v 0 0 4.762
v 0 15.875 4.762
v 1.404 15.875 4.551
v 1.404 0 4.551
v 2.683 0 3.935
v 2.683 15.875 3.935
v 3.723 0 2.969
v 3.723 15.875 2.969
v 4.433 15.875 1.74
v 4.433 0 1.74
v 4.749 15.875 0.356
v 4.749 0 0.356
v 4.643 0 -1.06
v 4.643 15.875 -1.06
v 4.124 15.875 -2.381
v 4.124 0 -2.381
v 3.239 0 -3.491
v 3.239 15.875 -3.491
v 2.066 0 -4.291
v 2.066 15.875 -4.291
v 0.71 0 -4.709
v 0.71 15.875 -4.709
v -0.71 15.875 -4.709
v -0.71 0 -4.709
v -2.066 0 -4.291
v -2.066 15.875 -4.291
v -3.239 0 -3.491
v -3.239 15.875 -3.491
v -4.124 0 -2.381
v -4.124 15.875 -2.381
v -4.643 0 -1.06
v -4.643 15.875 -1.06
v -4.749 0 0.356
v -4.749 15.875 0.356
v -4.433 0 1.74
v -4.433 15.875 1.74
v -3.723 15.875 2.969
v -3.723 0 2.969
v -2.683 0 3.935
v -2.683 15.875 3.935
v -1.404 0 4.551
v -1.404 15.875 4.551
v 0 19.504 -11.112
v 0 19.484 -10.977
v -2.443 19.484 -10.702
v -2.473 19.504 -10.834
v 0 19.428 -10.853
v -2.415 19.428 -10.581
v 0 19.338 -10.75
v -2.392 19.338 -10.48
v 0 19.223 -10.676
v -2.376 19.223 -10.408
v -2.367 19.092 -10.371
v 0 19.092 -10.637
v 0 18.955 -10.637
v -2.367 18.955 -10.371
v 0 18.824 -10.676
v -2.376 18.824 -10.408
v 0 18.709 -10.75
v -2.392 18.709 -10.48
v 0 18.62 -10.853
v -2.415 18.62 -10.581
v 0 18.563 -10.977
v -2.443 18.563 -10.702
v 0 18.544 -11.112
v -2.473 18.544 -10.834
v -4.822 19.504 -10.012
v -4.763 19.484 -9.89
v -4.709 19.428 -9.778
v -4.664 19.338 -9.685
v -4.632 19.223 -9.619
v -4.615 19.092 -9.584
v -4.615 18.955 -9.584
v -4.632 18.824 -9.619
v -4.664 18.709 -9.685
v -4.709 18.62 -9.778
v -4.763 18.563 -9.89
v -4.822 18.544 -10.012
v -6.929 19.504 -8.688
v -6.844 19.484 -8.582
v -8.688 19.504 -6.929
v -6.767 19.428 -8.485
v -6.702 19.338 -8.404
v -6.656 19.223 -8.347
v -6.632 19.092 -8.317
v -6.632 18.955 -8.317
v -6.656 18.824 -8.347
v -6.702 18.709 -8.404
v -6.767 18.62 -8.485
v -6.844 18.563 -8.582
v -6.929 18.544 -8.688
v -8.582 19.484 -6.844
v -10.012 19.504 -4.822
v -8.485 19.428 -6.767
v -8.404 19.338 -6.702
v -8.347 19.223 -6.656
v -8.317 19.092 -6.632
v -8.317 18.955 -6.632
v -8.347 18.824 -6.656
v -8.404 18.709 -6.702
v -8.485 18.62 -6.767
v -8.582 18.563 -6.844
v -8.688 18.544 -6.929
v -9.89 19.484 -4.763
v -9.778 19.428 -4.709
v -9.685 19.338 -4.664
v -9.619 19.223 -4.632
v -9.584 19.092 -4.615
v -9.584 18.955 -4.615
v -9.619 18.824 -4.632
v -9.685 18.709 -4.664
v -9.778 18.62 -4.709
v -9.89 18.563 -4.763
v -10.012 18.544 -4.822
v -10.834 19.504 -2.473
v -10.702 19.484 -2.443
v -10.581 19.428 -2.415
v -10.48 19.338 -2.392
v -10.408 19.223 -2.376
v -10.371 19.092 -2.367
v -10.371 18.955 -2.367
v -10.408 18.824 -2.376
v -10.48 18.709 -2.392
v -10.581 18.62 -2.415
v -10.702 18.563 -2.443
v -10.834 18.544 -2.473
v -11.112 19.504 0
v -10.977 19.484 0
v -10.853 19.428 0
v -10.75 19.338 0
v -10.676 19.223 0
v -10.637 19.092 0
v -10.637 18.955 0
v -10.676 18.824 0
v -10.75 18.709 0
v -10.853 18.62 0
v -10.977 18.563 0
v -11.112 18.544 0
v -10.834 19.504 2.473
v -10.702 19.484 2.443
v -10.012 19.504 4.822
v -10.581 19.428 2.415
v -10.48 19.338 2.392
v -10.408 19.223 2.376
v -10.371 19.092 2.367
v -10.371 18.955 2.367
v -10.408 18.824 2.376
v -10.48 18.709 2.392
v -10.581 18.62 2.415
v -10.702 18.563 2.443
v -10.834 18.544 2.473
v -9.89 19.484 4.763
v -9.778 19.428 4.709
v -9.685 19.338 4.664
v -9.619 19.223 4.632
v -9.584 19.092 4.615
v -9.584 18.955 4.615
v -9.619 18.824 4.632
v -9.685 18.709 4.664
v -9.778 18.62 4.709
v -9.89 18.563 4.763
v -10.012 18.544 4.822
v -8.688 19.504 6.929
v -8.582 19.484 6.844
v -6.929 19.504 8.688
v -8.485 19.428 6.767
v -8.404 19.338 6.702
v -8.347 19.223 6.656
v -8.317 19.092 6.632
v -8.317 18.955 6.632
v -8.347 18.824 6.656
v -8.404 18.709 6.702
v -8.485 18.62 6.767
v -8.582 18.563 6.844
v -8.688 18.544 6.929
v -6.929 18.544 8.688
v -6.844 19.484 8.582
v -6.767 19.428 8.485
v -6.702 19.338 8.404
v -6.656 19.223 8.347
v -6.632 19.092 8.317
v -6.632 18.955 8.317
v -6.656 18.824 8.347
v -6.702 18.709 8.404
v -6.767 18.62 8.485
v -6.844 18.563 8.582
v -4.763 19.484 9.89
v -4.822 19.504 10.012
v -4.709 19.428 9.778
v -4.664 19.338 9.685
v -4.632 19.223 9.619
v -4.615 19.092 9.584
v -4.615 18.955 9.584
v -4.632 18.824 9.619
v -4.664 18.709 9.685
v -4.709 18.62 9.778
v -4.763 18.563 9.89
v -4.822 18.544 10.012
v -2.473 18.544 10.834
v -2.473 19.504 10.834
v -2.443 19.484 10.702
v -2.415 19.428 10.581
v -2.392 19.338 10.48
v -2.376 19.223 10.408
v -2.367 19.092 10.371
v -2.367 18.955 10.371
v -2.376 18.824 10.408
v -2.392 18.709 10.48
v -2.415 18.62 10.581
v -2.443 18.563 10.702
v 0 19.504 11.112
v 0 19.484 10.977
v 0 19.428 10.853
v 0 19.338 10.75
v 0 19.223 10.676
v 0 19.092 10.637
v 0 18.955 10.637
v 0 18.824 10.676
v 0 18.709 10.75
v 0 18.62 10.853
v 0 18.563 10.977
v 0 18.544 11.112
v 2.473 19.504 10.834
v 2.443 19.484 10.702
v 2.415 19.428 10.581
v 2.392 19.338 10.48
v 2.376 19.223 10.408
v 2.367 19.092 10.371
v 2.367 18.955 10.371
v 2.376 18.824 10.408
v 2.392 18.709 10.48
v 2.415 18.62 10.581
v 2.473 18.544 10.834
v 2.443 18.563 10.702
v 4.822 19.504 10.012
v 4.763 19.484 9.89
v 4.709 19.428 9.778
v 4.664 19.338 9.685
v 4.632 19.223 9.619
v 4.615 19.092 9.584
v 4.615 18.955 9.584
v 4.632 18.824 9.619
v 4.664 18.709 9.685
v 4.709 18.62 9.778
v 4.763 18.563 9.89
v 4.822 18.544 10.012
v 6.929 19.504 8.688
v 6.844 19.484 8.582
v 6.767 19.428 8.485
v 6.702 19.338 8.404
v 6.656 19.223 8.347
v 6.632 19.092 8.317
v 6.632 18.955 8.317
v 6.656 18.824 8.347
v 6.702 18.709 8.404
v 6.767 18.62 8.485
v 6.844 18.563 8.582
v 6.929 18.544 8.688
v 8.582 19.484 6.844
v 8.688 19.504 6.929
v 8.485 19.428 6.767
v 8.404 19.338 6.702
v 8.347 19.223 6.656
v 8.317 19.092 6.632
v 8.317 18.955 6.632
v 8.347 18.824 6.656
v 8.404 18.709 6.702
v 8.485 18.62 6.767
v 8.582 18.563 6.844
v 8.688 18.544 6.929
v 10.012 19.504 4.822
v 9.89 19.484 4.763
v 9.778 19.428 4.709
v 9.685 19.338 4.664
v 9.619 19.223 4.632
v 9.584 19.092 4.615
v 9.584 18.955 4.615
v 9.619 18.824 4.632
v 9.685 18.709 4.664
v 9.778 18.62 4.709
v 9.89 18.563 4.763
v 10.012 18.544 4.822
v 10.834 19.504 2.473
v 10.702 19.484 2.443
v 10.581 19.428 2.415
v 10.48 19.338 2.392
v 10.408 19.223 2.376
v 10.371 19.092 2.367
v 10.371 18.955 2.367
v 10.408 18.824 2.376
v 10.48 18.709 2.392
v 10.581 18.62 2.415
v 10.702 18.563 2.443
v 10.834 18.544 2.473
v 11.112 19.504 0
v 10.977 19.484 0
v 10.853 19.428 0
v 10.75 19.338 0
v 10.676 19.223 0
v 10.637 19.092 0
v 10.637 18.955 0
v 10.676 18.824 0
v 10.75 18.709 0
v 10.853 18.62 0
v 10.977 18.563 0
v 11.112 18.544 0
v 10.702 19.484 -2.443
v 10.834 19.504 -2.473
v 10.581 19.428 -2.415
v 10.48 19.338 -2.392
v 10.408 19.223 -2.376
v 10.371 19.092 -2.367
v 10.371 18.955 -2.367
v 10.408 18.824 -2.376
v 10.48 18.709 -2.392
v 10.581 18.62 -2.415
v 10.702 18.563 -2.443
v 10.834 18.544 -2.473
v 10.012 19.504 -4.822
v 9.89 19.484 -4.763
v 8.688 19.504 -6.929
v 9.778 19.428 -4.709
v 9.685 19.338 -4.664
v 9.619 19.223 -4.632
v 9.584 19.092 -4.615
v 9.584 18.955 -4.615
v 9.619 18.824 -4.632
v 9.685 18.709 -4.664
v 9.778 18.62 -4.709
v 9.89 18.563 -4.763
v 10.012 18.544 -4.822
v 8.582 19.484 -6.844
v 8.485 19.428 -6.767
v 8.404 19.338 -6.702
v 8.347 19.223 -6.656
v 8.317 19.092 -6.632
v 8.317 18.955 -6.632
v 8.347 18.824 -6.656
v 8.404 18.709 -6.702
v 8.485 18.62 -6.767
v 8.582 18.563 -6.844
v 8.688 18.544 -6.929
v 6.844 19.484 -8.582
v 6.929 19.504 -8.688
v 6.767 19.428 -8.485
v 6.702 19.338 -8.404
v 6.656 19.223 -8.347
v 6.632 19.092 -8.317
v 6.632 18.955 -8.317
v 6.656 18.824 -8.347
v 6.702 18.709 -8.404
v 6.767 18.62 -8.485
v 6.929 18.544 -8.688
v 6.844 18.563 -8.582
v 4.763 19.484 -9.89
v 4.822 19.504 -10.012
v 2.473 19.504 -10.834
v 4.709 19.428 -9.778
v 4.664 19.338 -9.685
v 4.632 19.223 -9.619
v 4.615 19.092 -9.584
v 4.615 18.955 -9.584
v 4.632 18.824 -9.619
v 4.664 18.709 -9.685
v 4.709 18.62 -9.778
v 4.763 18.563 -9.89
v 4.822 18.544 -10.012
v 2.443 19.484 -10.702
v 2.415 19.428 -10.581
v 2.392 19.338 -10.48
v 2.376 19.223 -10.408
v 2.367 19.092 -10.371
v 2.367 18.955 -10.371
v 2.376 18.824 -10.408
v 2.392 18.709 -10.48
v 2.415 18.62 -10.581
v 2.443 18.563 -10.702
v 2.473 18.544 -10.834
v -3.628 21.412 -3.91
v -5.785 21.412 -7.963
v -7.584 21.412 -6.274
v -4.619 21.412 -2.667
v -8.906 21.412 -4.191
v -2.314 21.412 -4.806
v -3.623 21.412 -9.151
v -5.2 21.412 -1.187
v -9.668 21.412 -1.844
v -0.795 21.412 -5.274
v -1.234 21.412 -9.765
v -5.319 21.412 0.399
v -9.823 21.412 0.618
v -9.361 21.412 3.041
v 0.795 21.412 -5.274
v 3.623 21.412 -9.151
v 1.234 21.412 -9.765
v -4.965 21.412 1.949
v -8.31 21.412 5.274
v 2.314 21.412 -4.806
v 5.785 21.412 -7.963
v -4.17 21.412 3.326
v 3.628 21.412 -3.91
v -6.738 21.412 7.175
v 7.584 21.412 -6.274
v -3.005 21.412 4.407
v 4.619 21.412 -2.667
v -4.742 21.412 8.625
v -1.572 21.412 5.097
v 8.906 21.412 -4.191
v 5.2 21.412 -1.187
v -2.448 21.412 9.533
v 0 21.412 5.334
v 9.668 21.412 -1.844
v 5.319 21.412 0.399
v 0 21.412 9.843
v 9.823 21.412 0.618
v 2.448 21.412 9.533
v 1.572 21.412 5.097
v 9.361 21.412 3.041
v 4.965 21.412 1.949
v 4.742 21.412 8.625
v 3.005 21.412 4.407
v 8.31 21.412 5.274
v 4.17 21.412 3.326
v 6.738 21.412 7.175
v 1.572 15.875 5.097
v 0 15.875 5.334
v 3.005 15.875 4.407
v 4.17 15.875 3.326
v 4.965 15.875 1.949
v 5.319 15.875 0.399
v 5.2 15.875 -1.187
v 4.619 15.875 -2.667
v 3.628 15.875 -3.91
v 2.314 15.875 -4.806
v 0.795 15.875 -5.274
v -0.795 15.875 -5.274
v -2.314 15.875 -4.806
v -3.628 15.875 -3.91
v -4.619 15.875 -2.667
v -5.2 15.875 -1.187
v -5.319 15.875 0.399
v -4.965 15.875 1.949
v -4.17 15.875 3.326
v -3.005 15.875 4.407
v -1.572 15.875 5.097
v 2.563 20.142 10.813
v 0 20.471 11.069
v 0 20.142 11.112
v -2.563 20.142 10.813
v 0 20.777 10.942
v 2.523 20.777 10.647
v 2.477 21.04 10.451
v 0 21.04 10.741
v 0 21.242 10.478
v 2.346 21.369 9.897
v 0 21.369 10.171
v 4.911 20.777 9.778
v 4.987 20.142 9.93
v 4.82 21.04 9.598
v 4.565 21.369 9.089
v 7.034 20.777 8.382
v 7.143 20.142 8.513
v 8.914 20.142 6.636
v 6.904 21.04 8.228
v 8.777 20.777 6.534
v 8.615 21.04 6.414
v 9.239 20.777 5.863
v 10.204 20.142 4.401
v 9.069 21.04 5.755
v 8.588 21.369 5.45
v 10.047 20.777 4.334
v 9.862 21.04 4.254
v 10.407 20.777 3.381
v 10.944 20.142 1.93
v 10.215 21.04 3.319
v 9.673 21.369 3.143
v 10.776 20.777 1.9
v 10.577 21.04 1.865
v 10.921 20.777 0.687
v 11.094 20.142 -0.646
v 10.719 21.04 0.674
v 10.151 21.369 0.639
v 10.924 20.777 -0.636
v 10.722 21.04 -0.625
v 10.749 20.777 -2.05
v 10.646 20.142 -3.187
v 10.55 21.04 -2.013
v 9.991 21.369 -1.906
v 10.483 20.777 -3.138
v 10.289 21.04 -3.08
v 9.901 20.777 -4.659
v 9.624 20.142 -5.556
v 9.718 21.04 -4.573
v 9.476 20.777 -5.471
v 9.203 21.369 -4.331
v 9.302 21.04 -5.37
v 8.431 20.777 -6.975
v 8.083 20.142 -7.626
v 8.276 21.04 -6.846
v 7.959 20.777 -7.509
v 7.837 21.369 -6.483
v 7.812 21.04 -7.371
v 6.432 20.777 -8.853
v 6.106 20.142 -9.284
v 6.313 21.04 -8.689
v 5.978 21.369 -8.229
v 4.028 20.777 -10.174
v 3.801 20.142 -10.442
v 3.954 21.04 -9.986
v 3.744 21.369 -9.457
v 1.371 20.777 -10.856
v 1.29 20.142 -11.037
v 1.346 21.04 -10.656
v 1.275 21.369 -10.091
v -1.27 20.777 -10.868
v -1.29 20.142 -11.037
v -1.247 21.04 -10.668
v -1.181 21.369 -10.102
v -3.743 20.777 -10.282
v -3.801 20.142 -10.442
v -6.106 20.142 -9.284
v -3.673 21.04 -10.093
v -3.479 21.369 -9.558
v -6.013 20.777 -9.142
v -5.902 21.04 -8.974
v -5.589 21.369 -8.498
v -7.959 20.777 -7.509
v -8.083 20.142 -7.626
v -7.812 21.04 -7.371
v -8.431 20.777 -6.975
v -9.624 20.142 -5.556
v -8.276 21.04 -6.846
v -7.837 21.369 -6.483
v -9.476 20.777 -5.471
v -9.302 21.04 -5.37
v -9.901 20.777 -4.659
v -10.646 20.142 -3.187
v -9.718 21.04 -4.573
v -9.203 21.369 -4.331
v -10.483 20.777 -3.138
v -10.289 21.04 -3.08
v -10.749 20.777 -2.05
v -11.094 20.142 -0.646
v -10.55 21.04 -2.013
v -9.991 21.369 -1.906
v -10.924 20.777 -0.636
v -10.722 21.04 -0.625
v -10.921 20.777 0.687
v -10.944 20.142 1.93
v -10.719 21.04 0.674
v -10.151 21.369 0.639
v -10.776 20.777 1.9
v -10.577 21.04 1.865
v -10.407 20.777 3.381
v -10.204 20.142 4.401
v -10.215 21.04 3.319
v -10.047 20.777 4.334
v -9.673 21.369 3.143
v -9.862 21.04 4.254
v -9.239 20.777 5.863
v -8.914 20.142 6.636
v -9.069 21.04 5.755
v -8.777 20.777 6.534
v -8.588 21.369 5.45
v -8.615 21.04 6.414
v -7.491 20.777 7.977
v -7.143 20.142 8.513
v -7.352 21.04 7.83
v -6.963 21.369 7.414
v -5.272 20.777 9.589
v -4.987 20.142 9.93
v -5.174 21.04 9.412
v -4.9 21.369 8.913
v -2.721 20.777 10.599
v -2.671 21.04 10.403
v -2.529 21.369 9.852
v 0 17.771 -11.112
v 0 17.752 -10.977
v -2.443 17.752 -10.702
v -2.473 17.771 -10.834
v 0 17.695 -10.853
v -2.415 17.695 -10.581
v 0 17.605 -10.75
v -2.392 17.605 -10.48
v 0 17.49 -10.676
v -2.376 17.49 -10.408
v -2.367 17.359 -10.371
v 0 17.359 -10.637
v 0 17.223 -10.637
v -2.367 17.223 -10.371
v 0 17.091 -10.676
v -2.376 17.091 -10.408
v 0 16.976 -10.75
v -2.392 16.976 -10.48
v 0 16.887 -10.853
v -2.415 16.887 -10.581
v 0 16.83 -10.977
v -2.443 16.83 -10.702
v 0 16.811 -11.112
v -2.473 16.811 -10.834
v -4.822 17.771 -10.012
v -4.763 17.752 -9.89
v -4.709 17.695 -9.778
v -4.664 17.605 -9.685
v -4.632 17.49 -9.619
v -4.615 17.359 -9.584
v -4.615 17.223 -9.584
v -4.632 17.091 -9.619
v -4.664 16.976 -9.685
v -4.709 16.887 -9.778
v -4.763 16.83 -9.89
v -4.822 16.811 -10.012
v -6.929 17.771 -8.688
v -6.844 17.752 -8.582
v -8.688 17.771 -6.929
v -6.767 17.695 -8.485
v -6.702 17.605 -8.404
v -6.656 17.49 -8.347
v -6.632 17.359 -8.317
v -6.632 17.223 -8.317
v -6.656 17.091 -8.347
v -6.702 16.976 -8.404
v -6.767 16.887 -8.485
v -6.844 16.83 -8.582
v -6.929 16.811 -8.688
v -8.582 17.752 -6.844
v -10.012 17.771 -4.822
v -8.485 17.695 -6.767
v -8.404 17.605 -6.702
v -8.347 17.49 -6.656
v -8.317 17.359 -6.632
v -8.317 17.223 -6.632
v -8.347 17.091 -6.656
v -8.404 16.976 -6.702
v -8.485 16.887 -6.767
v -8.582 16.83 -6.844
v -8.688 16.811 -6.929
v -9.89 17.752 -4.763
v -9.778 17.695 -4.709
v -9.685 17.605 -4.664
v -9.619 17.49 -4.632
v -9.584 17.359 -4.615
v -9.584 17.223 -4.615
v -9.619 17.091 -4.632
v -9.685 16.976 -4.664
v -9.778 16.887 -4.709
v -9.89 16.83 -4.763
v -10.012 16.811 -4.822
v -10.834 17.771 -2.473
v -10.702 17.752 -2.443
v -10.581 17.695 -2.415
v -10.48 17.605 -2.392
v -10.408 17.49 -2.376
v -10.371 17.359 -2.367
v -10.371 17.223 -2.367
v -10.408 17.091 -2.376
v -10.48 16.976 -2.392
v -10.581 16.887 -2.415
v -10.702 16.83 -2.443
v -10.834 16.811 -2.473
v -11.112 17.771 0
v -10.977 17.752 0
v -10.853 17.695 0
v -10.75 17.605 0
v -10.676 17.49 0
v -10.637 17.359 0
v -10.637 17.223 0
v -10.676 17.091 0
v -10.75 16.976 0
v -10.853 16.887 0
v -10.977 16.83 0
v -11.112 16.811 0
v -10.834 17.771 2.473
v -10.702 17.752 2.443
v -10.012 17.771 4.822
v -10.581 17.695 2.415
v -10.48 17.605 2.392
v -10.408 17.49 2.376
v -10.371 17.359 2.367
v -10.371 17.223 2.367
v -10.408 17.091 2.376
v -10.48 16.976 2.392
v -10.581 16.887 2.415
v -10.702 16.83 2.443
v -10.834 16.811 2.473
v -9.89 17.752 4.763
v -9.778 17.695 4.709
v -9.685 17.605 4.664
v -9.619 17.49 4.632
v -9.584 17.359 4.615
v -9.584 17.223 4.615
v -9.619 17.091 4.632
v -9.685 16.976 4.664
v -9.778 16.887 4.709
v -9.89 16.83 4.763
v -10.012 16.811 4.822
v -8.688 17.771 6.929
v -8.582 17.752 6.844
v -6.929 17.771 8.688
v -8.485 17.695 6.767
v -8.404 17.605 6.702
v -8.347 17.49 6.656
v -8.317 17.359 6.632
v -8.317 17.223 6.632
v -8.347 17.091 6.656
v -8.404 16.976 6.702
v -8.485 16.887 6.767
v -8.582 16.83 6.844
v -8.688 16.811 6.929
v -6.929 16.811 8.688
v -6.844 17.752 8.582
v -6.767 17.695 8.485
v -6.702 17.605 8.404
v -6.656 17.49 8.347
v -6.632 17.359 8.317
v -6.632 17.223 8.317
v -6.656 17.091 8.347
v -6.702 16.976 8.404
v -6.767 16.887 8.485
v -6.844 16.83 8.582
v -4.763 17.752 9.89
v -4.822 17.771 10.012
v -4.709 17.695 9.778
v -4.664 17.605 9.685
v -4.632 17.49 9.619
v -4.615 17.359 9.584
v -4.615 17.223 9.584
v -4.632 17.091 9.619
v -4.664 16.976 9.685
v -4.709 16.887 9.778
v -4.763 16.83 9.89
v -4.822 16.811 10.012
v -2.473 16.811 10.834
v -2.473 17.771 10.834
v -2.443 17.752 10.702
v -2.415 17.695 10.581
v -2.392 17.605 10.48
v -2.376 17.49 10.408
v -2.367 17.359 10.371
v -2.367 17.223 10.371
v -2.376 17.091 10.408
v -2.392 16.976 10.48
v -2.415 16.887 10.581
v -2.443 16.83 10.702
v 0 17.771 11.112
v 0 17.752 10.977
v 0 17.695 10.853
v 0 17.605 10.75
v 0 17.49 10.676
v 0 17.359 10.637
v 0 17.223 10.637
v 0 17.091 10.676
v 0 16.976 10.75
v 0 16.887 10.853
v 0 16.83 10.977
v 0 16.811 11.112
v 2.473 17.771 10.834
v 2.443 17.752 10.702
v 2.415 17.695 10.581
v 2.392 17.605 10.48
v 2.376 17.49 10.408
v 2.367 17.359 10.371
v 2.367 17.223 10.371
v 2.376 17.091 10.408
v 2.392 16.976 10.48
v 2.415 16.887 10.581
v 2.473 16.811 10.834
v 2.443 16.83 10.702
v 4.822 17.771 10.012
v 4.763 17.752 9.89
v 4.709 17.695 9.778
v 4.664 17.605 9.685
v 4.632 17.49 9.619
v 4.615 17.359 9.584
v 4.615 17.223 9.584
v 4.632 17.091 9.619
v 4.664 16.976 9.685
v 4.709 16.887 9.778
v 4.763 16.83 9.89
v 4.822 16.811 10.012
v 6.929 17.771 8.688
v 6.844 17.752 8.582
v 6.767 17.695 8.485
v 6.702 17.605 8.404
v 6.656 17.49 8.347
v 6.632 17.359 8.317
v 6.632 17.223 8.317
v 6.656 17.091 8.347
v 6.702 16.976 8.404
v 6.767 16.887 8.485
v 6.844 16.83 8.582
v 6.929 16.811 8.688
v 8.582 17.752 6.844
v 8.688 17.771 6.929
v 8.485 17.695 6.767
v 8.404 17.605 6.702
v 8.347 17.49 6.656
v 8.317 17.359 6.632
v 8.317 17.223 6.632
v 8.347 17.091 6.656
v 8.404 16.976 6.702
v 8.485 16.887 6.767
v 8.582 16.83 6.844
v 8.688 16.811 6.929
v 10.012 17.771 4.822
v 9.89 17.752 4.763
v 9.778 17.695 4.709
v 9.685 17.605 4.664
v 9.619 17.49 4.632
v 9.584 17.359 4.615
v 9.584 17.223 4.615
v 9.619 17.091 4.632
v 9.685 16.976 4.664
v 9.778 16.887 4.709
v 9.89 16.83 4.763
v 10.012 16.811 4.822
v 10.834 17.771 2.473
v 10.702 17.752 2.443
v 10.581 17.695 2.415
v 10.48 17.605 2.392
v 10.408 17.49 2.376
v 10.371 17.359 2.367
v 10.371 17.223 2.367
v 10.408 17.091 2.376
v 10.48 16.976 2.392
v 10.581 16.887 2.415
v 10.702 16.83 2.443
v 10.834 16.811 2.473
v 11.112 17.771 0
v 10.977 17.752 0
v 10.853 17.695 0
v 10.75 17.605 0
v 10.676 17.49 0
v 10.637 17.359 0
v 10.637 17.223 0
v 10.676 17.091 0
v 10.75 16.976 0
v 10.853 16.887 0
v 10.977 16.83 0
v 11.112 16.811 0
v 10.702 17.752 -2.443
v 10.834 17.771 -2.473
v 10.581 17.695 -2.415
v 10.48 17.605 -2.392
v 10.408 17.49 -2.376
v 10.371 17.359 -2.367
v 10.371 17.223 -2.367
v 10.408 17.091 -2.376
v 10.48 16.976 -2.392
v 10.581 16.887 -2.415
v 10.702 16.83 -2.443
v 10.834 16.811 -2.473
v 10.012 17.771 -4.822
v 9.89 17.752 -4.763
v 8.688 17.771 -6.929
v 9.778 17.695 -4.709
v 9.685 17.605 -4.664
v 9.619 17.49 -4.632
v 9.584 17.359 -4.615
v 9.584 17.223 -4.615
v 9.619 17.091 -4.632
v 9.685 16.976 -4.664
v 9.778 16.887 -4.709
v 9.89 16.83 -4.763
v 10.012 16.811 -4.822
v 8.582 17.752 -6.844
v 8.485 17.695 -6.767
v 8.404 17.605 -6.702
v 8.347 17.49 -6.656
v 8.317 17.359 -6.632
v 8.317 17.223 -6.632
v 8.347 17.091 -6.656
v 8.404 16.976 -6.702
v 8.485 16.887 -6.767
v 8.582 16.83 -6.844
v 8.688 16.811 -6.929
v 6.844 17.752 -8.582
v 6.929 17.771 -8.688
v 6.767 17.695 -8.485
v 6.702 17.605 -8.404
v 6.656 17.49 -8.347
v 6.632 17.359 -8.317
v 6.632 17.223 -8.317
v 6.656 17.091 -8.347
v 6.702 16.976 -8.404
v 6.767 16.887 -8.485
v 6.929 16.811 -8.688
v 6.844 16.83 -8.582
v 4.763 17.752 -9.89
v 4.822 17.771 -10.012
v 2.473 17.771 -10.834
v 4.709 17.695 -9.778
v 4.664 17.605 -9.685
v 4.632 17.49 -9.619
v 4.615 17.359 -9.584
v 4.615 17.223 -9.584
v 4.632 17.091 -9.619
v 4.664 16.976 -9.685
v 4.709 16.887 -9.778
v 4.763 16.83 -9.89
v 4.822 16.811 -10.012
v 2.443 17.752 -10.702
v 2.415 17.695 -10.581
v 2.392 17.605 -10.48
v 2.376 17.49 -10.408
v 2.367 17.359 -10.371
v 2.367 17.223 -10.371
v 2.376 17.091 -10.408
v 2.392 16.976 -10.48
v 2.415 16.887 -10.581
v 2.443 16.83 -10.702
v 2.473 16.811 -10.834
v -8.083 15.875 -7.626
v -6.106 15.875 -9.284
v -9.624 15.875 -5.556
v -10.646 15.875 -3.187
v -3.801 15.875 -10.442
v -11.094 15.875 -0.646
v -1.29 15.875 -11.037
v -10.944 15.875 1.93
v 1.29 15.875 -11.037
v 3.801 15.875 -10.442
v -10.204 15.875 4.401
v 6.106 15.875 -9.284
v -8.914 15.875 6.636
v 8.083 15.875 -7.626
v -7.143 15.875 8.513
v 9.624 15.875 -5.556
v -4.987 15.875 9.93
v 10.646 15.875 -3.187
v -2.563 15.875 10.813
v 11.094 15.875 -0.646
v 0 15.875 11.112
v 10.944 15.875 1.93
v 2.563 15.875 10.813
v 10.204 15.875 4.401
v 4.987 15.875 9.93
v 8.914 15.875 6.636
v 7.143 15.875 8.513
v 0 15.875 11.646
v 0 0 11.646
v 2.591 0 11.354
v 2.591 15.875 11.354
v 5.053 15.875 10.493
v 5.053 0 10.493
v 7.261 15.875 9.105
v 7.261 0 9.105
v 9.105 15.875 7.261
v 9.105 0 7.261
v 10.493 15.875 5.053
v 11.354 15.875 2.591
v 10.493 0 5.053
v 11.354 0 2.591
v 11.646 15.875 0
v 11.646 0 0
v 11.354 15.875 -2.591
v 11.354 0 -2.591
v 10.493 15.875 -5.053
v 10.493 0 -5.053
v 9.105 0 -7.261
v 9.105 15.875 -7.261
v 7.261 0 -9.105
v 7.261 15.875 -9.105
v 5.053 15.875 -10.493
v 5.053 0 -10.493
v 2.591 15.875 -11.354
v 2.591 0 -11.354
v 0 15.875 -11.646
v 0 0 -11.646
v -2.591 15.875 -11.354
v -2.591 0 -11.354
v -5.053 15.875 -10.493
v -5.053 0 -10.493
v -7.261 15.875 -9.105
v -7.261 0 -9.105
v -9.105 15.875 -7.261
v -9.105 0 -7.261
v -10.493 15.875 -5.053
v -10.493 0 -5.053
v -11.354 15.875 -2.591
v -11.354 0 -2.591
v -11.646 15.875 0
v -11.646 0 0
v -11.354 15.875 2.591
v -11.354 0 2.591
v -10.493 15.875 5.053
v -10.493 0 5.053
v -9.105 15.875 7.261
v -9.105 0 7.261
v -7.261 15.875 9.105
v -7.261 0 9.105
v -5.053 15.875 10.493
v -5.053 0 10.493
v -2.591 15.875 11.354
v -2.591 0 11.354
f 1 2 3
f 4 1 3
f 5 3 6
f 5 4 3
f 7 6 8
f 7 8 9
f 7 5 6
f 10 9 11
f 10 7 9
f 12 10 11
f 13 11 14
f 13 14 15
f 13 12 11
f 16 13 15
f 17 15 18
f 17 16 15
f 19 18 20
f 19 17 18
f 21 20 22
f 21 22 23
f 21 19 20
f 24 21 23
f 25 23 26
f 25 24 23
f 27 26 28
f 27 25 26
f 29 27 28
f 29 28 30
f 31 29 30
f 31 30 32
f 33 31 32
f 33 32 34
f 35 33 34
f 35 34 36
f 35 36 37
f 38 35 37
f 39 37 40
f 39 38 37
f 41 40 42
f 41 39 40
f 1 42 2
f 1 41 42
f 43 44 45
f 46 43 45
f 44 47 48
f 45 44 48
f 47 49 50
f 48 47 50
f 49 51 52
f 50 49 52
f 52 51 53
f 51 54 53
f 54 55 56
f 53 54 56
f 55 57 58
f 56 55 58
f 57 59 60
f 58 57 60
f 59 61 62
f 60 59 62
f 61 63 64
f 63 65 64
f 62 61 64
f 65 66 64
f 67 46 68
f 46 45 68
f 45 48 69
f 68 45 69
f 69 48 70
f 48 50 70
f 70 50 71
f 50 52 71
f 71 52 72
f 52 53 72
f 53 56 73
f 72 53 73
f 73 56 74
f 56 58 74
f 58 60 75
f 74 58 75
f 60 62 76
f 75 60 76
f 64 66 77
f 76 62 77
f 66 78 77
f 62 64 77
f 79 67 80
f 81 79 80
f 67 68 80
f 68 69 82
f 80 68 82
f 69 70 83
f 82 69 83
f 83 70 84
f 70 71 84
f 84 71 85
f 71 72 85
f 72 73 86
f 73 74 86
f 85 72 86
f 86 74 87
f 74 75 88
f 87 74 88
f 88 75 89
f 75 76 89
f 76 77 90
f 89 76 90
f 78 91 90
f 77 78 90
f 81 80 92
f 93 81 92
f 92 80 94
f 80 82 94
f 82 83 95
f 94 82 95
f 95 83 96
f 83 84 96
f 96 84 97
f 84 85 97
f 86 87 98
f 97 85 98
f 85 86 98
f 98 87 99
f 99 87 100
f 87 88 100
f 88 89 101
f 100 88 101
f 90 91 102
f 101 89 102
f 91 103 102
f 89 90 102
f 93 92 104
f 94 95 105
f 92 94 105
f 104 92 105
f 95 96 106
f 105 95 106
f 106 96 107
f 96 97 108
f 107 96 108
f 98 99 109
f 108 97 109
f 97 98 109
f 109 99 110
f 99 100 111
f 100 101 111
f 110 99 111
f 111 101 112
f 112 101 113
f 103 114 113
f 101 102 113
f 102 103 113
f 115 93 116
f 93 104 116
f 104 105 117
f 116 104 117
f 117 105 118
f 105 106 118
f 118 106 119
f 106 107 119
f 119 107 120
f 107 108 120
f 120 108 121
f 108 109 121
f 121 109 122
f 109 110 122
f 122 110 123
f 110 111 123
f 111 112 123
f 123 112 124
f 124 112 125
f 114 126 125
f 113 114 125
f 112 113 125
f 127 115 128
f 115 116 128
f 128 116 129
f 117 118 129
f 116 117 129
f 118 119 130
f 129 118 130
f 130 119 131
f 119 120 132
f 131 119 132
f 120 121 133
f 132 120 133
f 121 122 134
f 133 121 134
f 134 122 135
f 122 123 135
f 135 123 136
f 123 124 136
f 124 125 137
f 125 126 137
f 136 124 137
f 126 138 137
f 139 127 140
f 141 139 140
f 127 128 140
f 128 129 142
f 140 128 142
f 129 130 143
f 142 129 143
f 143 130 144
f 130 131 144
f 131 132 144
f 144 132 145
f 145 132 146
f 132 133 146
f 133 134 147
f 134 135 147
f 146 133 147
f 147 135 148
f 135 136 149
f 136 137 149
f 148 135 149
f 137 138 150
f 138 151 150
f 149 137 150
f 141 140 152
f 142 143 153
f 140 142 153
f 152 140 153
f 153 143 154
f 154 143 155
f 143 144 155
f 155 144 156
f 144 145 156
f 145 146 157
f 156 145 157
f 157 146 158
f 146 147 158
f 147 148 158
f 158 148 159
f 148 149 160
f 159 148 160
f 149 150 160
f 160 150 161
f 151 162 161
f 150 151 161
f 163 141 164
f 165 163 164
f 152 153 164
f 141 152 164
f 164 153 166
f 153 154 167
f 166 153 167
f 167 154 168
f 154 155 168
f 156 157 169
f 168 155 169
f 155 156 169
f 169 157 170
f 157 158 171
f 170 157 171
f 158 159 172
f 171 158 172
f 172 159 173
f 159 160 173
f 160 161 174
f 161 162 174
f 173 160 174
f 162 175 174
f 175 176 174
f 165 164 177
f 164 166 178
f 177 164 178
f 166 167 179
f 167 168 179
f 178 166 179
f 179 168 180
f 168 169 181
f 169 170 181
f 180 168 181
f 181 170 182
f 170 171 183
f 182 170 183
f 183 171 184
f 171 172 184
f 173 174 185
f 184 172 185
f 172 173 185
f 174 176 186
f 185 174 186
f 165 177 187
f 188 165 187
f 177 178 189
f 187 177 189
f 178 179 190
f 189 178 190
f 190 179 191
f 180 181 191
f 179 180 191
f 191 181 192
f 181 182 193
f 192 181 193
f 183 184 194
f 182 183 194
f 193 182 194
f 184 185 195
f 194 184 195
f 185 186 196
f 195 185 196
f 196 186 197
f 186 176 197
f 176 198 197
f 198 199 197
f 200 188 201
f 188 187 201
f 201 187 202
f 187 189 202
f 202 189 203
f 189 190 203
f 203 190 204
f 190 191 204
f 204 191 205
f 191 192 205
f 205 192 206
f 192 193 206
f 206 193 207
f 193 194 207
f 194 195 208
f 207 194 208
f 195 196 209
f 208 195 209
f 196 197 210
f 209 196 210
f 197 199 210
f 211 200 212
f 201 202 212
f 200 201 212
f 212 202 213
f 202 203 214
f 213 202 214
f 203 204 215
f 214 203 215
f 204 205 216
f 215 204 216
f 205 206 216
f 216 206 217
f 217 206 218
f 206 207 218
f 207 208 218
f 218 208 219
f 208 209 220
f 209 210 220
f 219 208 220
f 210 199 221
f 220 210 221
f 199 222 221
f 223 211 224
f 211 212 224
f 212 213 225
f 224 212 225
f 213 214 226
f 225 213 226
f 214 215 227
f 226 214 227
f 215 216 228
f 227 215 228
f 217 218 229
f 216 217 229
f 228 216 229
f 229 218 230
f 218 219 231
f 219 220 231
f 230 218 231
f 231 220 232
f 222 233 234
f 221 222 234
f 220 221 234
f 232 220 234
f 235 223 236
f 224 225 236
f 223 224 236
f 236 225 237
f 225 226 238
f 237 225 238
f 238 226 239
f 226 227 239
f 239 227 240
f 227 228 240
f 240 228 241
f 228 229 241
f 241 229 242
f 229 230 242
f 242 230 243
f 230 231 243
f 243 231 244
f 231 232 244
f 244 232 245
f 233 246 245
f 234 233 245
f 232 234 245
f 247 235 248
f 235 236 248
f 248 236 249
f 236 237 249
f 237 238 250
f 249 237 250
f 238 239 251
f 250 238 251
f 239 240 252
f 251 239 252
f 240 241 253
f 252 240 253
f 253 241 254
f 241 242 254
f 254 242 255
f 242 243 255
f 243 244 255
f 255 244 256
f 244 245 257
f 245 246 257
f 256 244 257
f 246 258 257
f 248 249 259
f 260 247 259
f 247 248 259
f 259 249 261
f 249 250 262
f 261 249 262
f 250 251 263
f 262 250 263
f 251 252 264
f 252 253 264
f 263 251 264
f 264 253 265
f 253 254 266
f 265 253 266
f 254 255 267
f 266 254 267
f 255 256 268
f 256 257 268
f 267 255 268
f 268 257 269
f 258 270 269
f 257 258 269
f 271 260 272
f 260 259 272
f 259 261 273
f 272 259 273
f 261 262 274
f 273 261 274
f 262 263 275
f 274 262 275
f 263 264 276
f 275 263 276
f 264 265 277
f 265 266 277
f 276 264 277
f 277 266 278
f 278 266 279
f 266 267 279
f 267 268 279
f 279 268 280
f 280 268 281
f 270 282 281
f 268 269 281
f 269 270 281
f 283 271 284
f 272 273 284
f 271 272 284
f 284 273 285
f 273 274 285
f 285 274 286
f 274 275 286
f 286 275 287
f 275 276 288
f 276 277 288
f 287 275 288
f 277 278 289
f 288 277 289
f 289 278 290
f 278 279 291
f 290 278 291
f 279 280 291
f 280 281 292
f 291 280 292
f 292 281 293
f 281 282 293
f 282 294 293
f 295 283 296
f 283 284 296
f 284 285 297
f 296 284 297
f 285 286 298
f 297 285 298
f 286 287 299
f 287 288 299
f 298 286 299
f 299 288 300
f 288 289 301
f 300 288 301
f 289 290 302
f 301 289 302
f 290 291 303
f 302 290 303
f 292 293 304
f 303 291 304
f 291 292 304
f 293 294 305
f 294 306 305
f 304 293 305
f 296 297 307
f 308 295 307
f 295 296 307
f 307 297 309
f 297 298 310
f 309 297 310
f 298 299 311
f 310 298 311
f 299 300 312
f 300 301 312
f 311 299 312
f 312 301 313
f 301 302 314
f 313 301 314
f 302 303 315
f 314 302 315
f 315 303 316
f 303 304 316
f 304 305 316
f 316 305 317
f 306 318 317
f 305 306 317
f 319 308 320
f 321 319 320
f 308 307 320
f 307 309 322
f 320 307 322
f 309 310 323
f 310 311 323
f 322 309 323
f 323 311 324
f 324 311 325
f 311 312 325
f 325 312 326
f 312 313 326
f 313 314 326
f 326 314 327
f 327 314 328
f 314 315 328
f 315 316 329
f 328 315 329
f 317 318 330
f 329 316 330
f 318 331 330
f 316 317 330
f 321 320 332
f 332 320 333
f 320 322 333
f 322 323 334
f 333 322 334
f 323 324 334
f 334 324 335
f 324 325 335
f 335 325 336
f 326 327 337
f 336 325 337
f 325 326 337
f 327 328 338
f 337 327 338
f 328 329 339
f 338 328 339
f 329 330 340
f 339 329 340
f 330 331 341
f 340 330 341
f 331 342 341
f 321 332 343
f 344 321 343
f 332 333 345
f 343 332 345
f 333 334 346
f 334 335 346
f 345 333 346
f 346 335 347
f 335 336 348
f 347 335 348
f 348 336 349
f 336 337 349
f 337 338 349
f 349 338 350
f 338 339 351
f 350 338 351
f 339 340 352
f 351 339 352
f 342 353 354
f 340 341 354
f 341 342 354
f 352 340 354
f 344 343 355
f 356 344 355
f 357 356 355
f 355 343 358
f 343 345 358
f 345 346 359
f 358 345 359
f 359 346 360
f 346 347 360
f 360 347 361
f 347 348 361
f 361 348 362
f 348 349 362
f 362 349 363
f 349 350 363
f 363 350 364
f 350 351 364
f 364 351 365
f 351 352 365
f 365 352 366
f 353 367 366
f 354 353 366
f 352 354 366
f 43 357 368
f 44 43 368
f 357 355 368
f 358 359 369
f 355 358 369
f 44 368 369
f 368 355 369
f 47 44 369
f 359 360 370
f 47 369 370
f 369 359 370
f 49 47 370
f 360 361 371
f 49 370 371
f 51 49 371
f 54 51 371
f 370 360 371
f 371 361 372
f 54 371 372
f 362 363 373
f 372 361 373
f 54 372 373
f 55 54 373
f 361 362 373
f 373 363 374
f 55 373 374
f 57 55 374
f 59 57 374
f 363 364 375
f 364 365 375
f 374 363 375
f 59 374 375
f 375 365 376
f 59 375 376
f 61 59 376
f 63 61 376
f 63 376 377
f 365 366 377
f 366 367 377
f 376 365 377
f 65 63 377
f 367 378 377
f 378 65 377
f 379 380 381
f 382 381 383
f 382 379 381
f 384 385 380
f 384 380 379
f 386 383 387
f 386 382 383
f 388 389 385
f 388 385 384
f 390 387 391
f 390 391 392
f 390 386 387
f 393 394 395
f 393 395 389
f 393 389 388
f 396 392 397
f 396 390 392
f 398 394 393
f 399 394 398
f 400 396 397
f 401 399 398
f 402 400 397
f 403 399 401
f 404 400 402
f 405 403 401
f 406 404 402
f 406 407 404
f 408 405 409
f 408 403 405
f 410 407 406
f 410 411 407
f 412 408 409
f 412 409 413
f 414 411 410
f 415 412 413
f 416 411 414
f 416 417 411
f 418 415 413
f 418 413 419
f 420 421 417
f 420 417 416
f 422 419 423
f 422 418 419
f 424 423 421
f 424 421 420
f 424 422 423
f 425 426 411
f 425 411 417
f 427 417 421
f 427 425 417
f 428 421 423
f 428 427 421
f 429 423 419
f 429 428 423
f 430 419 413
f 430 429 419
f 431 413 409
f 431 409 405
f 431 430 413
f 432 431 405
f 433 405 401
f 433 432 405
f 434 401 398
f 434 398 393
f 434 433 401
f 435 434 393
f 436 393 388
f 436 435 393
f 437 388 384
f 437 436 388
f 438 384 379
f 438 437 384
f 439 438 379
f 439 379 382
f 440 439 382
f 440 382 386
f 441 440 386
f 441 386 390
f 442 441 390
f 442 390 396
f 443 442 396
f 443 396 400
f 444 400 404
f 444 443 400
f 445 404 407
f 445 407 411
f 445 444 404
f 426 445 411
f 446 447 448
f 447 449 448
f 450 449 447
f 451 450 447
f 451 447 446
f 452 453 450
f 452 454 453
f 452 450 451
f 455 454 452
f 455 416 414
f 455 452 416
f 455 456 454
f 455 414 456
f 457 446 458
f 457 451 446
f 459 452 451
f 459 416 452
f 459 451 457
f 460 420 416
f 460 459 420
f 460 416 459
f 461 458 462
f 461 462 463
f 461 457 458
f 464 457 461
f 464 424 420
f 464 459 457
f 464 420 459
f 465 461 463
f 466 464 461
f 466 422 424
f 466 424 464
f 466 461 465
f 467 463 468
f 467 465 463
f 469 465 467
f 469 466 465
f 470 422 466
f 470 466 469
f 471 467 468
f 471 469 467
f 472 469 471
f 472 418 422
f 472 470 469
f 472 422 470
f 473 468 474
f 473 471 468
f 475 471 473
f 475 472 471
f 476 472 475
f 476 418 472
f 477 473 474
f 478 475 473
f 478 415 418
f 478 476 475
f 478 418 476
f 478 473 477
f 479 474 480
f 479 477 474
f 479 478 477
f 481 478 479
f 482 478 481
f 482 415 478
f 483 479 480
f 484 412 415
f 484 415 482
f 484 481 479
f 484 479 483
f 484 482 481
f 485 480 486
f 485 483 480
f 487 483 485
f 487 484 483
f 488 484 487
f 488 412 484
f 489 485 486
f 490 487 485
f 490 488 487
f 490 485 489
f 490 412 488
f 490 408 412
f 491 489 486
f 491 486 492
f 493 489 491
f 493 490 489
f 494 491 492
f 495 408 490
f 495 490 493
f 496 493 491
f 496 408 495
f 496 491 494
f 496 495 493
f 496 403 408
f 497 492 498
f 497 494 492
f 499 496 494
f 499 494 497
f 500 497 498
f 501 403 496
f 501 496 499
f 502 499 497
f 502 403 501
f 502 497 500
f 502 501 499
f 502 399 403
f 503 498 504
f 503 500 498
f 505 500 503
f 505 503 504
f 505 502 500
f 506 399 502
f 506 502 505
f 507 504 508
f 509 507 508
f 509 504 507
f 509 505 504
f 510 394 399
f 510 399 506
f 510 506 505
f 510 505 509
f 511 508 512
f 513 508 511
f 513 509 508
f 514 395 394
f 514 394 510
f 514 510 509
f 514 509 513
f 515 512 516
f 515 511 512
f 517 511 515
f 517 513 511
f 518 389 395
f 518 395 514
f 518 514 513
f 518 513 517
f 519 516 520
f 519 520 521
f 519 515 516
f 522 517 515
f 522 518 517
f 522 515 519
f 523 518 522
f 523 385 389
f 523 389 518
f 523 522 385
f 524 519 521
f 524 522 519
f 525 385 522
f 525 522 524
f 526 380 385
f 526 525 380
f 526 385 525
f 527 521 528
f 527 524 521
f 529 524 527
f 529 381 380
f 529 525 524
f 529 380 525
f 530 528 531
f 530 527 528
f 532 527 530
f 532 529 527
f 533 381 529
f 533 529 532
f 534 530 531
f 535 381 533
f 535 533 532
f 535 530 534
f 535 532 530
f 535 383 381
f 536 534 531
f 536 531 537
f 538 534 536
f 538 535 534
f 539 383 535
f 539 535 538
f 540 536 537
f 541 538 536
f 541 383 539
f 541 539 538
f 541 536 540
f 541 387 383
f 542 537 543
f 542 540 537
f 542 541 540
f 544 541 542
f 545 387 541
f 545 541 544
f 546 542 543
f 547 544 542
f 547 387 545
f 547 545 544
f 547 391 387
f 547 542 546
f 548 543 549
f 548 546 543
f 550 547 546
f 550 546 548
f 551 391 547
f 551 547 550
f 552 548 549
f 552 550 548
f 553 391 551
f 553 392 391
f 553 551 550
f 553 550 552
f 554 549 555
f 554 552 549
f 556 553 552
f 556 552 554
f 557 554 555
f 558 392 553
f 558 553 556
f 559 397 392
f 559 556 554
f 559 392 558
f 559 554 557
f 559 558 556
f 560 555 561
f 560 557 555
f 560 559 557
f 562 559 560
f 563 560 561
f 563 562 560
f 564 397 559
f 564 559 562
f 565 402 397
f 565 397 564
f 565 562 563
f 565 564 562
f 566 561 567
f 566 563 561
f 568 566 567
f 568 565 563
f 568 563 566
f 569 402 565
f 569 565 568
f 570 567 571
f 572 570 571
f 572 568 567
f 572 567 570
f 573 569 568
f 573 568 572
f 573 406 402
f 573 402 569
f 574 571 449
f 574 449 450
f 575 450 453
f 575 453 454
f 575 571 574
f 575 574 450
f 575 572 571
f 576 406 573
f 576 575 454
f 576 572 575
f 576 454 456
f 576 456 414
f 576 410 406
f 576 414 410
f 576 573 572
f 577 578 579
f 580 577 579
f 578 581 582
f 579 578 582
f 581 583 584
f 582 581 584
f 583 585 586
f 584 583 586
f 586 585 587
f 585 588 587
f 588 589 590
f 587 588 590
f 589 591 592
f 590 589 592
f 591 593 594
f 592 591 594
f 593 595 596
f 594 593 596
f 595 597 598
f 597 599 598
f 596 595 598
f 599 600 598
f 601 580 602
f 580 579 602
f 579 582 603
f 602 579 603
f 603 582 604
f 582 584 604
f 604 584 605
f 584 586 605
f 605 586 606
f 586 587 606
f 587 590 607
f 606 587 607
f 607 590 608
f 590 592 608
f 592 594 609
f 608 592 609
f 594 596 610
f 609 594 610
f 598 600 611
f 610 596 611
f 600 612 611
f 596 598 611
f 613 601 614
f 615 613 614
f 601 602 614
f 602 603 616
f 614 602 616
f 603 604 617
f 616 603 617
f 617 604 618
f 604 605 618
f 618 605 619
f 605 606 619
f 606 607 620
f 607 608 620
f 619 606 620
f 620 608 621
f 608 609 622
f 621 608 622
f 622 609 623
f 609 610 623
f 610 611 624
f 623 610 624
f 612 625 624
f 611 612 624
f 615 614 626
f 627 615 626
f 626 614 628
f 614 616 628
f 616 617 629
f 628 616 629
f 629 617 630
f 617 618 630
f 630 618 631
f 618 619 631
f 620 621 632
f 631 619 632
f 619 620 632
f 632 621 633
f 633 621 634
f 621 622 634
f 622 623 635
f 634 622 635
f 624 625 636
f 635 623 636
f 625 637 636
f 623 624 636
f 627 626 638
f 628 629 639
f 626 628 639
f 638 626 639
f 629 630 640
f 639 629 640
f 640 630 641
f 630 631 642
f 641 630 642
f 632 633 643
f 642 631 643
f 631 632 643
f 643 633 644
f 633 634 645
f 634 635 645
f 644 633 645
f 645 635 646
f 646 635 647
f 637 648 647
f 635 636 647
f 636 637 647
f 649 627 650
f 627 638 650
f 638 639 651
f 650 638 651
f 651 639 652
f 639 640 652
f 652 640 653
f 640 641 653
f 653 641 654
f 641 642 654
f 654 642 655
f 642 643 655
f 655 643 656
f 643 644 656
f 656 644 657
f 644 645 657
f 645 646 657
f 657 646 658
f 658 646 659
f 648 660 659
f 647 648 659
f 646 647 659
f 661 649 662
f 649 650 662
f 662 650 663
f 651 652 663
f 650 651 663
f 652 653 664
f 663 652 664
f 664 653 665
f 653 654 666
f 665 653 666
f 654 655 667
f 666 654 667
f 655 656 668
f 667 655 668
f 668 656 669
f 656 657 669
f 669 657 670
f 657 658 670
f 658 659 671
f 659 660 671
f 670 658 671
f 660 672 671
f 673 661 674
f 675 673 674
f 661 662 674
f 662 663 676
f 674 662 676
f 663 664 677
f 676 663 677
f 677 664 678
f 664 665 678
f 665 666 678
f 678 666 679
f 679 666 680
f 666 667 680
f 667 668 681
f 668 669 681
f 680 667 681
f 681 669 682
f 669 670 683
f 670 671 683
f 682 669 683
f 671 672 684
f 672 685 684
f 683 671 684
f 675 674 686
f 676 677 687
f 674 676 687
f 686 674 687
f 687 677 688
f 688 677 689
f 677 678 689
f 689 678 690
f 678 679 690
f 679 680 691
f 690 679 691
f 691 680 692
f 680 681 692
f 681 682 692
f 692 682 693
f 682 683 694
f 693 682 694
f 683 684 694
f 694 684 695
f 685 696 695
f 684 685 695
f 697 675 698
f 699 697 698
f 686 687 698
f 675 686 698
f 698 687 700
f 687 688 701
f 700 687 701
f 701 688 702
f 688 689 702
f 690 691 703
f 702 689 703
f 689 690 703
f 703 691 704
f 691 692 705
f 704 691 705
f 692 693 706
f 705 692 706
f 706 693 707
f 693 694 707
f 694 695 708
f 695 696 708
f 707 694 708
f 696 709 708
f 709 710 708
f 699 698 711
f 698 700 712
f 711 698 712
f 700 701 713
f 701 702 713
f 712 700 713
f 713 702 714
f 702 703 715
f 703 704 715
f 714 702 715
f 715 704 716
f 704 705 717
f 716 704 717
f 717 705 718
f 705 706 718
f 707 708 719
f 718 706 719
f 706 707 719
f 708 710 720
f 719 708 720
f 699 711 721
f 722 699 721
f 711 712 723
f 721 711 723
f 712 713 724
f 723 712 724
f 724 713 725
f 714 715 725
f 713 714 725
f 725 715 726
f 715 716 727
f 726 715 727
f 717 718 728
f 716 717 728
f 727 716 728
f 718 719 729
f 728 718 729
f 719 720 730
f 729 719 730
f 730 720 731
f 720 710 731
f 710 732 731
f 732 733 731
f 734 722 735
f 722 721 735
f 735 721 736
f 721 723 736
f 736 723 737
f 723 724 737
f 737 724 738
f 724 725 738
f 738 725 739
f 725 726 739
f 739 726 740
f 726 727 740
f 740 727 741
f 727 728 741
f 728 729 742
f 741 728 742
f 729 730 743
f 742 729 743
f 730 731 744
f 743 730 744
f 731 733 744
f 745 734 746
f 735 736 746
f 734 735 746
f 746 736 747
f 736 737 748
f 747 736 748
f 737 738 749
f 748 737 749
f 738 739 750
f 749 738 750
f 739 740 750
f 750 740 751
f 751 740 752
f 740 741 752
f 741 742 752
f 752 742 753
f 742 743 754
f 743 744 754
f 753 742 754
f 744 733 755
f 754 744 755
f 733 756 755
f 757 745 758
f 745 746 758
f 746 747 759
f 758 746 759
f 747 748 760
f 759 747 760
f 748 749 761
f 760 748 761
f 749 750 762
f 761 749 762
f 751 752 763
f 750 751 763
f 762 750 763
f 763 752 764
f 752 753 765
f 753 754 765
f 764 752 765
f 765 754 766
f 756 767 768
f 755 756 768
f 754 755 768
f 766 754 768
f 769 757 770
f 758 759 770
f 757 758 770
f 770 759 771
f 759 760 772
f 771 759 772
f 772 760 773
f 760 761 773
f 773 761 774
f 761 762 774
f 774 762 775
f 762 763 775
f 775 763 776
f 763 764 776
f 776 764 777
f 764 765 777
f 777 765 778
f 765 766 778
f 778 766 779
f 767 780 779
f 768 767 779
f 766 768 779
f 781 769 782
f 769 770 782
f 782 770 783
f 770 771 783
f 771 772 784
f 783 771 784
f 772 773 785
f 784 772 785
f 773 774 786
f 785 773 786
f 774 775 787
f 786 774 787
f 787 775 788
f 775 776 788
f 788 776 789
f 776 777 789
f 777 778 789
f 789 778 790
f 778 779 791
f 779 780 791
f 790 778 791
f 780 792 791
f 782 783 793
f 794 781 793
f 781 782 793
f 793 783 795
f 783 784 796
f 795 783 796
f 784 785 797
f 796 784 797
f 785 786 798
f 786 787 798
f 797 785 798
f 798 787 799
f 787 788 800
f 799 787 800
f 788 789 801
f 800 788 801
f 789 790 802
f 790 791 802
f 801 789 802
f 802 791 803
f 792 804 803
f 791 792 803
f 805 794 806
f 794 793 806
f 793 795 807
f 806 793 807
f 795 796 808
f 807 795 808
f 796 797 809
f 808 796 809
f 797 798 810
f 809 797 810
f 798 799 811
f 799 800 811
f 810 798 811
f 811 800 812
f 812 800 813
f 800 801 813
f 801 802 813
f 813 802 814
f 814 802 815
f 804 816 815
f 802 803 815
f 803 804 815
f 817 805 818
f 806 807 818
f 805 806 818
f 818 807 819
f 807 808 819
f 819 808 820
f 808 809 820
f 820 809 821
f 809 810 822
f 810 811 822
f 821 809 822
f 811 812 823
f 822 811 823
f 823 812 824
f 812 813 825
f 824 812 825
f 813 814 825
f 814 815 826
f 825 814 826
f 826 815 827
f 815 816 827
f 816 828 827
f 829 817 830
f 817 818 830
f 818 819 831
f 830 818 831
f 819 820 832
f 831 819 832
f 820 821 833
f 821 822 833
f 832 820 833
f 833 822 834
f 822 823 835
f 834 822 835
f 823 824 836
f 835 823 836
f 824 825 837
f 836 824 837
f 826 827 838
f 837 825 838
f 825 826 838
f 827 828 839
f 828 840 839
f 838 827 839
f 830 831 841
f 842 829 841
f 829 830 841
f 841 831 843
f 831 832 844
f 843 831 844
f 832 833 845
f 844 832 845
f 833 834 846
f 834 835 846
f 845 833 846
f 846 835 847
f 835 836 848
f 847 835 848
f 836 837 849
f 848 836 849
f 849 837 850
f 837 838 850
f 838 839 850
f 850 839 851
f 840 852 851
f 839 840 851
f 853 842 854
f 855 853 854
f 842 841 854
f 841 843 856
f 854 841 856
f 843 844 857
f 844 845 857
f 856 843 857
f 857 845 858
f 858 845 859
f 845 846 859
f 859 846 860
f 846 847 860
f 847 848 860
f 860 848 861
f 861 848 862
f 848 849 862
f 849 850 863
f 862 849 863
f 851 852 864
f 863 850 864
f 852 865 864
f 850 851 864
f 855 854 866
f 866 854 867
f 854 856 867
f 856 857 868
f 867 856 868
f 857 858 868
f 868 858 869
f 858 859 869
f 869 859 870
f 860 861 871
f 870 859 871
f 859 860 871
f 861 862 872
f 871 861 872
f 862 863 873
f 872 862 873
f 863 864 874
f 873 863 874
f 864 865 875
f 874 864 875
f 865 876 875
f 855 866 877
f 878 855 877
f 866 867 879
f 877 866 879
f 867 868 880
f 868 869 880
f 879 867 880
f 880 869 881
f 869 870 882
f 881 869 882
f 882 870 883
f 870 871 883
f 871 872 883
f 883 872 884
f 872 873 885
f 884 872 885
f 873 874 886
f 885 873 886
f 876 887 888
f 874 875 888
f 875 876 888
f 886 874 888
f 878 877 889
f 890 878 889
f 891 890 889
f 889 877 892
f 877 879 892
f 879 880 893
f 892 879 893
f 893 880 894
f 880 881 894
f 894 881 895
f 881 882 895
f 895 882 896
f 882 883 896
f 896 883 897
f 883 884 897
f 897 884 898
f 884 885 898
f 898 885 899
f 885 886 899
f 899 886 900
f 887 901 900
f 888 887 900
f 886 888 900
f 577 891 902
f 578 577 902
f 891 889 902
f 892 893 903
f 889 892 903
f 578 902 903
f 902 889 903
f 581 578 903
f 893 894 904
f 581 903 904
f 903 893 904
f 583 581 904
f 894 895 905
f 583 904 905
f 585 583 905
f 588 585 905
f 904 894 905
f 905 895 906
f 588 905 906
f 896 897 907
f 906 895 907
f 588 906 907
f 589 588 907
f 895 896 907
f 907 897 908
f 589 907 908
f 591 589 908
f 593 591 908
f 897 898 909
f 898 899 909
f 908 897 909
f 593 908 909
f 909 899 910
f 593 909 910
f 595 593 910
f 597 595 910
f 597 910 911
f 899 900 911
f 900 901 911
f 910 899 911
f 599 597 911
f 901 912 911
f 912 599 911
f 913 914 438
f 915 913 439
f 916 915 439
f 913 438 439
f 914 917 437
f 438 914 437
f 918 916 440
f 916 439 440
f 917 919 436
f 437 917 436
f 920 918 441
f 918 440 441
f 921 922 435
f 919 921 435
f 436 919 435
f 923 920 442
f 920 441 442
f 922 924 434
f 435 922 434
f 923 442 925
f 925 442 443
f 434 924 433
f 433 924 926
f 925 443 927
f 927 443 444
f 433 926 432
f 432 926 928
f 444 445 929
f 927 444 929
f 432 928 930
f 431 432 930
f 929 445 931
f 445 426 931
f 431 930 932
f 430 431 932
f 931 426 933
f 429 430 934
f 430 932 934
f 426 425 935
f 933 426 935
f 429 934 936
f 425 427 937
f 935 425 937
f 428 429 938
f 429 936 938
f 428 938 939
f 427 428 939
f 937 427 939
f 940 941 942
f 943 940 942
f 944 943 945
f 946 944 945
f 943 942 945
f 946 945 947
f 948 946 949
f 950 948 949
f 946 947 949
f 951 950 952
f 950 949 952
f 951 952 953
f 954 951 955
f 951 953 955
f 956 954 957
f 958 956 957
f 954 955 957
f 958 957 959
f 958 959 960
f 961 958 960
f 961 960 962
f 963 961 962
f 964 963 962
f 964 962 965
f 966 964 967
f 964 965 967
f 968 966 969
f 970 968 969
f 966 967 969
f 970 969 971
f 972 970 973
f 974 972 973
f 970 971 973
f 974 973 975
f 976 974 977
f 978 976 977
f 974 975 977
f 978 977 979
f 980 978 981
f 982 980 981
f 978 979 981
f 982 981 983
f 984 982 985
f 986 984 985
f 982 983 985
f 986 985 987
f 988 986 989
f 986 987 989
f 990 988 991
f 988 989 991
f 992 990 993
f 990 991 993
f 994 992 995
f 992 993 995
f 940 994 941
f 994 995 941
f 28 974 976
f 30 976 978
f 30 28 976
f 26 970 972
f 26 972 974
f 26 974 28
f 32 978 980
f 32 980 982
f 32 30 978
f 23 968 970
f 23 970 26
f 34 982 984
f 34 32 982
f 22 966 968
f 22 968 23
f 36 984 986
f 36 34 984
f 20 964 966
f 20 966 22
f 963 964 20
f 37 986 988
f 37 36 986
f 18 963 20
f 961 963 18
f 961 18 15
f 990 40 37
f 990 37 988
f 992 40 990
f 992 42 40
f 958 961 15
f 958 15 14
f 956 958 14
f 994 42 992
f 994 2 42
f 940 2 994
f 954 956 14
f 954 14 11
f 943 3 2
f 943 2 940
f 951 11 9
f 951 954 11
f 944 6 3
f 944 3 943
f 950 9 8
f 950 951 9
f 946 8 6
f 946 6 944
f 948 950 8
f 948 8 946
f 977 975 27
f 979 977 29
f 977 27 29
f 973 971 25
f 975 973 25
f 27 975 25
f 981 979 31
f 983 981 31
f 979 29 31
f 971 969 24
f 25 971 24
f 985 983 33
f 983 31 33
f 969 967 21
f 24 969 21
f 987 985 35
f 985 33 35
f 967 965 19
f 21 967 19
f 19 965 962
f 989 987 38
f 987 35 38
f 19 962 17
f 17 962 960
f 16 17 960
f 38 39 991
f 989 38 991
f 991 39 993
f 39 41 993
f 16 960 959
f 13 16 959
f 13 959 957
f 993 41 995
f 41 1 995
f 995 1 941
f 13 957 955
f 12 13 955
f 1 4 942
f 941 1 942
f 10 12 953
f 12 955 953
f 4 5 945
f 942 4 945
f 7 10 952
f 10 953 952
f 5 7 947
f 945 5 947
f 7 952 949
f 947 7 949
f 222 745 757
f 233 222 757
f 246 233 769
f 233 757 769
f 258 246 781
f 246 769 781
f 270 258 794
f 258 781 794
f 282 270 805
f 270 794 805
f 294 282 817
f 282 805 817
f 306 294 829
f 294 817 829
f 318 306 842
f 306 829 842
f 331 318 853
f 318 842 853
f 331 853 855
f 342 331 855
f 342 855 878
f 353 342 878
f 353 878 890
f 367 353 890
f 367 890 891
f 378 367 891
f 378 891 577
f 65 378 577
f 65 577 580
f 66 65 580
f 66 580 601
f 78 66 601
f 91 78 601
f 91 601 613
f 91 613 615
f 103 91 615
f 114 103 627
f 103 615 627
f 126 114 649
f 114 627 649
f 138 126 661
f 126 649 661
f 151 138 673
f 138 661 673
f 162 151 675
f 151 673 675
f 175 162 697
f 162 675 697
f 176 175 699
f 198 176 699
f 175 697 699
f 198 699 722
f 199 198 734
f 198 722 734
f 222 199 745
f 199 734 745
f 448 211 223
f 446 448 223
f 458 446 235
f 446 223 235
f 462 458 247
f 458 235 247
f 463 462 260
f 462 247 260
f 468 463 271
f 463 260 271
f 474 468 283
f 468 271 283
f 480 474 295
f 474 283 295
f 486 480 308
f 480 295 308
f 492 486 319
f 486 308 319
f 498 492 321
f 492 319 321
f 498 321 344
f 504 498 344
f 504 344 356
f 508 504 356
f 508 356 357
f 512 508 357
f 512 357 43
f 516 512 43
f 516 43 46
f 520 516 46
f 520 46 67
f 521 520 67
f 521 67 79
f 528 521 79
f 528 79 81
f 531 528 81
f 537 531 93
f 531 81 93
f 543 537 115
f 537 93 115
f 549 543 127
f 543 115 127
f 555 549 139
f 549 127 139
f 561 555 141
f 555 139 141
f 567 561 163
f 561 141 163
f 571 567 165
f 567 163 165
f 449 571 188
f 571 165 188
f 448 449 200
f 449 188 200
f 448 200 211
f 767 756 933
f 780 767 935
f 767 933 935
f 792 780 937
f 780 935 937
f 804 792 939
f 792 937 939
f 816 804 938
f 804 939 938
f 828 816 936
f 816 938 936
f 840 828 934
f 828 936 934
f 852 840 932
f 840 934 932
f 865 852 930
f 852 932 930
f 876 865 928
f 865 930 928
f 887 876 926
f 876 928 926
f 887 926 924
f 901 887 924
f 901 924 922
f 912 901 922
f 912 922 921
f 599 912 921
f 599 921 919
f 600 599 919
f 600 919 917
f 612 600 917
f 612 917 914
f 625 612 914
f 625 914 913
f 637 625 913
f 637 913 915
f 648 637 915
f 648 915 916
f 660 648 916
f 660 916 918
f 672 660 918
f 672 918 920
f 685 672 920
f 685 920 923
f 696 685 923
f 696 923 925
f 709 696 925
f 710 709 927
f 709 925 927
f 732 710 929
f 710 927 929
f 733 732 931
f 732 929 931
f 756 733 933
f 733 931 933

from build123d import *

# Parameters (mm, degrees)
SKETCH1_R   = 11.6459
SKETCH1_R_2 = 4.7625
LOWER_DEPTH = 15.875
SKETCH2_R   = 11.1125
SKETCH2_R_2 = 5.334
SEAT_DEPTH  = 5.5372
FILLET1_R   = 1.27


with BuildPart() as part:
    # Sketch1 → lower (new body)
    with BuildSketch(Plane(origin=(0, 0, 0), x_dir=(1, 0, 0), z_dir=(0, 1, 0))):
        with Locations(Location((0, 0, 0), (0, 0, 270))):
            Circle(SKETCH1_R)
        with Locations(Location((0, 0, 0), (0, 0, 270))):
            Circle(SKETCH1_R_2, mode=Mode.SUBTRACT)
    extrude(amount=LOWER_DEPTH)


with BuildPart() as body_2:
    # Sketch2 → seat (new body)
    with BuildSketch(Plane(origin=(0, 15.875, 0), x_dir=(1, 0, 0), z_dir=(0, 1, 0))):
        with Locations(Location((0, 0, 0), (0, 0, 270))):
            Circle(SKETCH2_R)
        with Locations(Location((0, 0, 0), (0, 0, 270))):
            Circle(SKETCH2_R_2, mode=Mode.SUBTRACT)
    extrude(amount=SEAT_DEPTH)

    # Fillet1
    fillet1_edges = [body_2.edges().sort_by_distance(p)[0] for p in [
        (0, 21.4122, -11.1125),
    ]]
    fillet(fillet1_edges, radius=FILLET1_R)

    # Sketch3 → Cut-Revolve1 (revolve, cut)
    with BuildSketch(Plane.XY, mode=Mode.PRIVATE) as cut_revolve1_sk:
        with BuildLine():
            Line((-11.1125, 20.1422), (-11.1125, 19.50391487))
            ThreePointArc((-11.1125, 19.50391487), (-10.632340758, 19.023755628), (-11.1125, 18.543596386))
            Line((-11.1125, 18.543596386), (-11.1125, 17.771082329))
            ThreePointArc((-11.1125, 17.771082329), (-10.632340758, 17.290923087), (-11.1125, 16.810763845))
            Line((-11.1125, 16.810763845), (-11.1125, 15.875))
            Line((-11.1125, 15.875), (-12.694987605, 15.875))
            Line((-12.694987605, 15.875), (-12.694987605, 20.1422))
            Line((-12.694987605, 20.1422), (-11.1125, 20.1422))
        make_face()
    revolve(cut_revolve1_sk.sketch.rotate(Axis((0, 0, 0), (0, 1, 0)), 270), axis=Axis((0, 0, 0), (0, 1, 0)), mode=Mode.SUBTRACT)


solid = Compound([part.part, body_2.part])
